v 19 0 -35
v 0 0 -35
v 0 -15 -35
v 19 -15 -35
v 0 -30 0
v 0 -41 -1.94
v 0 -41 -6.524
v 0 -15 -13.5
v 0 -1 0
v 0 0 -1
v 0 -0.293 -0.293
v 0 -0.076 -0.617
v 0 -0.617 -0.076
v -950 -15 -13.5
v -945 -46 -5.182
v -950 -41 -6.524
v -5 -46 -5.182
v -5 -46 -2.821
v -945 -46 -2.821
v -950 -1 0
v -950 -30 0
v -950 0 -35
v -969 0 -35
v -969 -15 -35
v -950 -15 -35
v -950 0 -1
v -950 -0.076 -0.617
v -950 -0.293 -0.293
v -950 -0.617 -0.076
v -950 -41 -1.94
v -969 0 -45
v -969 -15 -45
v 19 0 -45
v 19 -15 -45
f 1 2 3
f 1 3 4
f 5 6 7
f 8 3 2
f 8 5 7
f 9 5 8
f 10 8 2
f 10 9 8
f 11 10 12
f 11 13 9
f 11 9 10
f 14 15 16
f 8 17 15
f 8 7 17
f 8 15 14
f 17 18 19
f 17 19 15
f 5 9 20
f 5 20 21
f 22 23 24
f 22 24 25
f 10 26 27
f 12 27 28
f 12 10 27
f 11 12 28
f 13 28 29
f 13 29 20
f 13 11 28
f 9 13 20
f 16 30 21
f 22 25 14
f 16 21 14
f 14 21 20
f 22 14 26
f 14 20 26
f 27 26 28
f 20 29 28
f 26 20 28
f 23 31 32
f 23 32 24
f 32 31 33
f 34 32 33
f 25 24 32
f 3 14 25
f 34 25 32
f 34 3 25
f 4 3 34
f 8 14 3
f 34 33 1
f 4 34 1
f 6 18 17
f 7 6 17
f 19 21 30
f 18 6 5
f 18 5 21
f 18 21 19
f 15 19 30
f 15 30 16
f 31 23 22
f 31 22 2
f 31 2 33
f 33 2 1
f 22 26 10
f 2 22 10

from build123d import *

# Parameters (mm, degrees)
F1_DEPTH = 950
F2_W     = 988
F2_H     = 10
F3_DEPTH = 15
F4_SIZE  = 5


with BuildPart() as f1:
    # F0 (on Right) → F1 (new body)
    with BuildSketch(Plane.YZ):
        with BuildLine():
            ThreePointArc((0, -1), (-0.292893, -0.292893), (-1, 0))
            Line((-1, 0), (-30, 0))
            Line((-30, 0), (-46, -2.821232))
            Line((-46, -2.821232), (-46, -5.181976))
            Line((-46, -5.181976), (-15, -13.5))
            Line((-15, -13.5), (-15, -45))
            Line((-15, -45), (0, -45))
            Line((0, -45), (0, -1))
        make_face()
    extrude(amount=-F1_DEPTH)

    # F2 (on Front) → F3 (join)
    with BuildSketch(Plane.XZ):
        with Locations((-475, -40)):
            Rectangle(F2_W, F2_H)
    extrude(amount=F3_DEPTH)

    # F4
    f4_edges = [f1.edges().sort_by_distance(p)[0] for p in [
        (0, -46, -4.001604),
        (-950, -46, -4.001604),
    ]]
    chamfer(f4_edges, length=F4_SIZE)


solid = f1.part
